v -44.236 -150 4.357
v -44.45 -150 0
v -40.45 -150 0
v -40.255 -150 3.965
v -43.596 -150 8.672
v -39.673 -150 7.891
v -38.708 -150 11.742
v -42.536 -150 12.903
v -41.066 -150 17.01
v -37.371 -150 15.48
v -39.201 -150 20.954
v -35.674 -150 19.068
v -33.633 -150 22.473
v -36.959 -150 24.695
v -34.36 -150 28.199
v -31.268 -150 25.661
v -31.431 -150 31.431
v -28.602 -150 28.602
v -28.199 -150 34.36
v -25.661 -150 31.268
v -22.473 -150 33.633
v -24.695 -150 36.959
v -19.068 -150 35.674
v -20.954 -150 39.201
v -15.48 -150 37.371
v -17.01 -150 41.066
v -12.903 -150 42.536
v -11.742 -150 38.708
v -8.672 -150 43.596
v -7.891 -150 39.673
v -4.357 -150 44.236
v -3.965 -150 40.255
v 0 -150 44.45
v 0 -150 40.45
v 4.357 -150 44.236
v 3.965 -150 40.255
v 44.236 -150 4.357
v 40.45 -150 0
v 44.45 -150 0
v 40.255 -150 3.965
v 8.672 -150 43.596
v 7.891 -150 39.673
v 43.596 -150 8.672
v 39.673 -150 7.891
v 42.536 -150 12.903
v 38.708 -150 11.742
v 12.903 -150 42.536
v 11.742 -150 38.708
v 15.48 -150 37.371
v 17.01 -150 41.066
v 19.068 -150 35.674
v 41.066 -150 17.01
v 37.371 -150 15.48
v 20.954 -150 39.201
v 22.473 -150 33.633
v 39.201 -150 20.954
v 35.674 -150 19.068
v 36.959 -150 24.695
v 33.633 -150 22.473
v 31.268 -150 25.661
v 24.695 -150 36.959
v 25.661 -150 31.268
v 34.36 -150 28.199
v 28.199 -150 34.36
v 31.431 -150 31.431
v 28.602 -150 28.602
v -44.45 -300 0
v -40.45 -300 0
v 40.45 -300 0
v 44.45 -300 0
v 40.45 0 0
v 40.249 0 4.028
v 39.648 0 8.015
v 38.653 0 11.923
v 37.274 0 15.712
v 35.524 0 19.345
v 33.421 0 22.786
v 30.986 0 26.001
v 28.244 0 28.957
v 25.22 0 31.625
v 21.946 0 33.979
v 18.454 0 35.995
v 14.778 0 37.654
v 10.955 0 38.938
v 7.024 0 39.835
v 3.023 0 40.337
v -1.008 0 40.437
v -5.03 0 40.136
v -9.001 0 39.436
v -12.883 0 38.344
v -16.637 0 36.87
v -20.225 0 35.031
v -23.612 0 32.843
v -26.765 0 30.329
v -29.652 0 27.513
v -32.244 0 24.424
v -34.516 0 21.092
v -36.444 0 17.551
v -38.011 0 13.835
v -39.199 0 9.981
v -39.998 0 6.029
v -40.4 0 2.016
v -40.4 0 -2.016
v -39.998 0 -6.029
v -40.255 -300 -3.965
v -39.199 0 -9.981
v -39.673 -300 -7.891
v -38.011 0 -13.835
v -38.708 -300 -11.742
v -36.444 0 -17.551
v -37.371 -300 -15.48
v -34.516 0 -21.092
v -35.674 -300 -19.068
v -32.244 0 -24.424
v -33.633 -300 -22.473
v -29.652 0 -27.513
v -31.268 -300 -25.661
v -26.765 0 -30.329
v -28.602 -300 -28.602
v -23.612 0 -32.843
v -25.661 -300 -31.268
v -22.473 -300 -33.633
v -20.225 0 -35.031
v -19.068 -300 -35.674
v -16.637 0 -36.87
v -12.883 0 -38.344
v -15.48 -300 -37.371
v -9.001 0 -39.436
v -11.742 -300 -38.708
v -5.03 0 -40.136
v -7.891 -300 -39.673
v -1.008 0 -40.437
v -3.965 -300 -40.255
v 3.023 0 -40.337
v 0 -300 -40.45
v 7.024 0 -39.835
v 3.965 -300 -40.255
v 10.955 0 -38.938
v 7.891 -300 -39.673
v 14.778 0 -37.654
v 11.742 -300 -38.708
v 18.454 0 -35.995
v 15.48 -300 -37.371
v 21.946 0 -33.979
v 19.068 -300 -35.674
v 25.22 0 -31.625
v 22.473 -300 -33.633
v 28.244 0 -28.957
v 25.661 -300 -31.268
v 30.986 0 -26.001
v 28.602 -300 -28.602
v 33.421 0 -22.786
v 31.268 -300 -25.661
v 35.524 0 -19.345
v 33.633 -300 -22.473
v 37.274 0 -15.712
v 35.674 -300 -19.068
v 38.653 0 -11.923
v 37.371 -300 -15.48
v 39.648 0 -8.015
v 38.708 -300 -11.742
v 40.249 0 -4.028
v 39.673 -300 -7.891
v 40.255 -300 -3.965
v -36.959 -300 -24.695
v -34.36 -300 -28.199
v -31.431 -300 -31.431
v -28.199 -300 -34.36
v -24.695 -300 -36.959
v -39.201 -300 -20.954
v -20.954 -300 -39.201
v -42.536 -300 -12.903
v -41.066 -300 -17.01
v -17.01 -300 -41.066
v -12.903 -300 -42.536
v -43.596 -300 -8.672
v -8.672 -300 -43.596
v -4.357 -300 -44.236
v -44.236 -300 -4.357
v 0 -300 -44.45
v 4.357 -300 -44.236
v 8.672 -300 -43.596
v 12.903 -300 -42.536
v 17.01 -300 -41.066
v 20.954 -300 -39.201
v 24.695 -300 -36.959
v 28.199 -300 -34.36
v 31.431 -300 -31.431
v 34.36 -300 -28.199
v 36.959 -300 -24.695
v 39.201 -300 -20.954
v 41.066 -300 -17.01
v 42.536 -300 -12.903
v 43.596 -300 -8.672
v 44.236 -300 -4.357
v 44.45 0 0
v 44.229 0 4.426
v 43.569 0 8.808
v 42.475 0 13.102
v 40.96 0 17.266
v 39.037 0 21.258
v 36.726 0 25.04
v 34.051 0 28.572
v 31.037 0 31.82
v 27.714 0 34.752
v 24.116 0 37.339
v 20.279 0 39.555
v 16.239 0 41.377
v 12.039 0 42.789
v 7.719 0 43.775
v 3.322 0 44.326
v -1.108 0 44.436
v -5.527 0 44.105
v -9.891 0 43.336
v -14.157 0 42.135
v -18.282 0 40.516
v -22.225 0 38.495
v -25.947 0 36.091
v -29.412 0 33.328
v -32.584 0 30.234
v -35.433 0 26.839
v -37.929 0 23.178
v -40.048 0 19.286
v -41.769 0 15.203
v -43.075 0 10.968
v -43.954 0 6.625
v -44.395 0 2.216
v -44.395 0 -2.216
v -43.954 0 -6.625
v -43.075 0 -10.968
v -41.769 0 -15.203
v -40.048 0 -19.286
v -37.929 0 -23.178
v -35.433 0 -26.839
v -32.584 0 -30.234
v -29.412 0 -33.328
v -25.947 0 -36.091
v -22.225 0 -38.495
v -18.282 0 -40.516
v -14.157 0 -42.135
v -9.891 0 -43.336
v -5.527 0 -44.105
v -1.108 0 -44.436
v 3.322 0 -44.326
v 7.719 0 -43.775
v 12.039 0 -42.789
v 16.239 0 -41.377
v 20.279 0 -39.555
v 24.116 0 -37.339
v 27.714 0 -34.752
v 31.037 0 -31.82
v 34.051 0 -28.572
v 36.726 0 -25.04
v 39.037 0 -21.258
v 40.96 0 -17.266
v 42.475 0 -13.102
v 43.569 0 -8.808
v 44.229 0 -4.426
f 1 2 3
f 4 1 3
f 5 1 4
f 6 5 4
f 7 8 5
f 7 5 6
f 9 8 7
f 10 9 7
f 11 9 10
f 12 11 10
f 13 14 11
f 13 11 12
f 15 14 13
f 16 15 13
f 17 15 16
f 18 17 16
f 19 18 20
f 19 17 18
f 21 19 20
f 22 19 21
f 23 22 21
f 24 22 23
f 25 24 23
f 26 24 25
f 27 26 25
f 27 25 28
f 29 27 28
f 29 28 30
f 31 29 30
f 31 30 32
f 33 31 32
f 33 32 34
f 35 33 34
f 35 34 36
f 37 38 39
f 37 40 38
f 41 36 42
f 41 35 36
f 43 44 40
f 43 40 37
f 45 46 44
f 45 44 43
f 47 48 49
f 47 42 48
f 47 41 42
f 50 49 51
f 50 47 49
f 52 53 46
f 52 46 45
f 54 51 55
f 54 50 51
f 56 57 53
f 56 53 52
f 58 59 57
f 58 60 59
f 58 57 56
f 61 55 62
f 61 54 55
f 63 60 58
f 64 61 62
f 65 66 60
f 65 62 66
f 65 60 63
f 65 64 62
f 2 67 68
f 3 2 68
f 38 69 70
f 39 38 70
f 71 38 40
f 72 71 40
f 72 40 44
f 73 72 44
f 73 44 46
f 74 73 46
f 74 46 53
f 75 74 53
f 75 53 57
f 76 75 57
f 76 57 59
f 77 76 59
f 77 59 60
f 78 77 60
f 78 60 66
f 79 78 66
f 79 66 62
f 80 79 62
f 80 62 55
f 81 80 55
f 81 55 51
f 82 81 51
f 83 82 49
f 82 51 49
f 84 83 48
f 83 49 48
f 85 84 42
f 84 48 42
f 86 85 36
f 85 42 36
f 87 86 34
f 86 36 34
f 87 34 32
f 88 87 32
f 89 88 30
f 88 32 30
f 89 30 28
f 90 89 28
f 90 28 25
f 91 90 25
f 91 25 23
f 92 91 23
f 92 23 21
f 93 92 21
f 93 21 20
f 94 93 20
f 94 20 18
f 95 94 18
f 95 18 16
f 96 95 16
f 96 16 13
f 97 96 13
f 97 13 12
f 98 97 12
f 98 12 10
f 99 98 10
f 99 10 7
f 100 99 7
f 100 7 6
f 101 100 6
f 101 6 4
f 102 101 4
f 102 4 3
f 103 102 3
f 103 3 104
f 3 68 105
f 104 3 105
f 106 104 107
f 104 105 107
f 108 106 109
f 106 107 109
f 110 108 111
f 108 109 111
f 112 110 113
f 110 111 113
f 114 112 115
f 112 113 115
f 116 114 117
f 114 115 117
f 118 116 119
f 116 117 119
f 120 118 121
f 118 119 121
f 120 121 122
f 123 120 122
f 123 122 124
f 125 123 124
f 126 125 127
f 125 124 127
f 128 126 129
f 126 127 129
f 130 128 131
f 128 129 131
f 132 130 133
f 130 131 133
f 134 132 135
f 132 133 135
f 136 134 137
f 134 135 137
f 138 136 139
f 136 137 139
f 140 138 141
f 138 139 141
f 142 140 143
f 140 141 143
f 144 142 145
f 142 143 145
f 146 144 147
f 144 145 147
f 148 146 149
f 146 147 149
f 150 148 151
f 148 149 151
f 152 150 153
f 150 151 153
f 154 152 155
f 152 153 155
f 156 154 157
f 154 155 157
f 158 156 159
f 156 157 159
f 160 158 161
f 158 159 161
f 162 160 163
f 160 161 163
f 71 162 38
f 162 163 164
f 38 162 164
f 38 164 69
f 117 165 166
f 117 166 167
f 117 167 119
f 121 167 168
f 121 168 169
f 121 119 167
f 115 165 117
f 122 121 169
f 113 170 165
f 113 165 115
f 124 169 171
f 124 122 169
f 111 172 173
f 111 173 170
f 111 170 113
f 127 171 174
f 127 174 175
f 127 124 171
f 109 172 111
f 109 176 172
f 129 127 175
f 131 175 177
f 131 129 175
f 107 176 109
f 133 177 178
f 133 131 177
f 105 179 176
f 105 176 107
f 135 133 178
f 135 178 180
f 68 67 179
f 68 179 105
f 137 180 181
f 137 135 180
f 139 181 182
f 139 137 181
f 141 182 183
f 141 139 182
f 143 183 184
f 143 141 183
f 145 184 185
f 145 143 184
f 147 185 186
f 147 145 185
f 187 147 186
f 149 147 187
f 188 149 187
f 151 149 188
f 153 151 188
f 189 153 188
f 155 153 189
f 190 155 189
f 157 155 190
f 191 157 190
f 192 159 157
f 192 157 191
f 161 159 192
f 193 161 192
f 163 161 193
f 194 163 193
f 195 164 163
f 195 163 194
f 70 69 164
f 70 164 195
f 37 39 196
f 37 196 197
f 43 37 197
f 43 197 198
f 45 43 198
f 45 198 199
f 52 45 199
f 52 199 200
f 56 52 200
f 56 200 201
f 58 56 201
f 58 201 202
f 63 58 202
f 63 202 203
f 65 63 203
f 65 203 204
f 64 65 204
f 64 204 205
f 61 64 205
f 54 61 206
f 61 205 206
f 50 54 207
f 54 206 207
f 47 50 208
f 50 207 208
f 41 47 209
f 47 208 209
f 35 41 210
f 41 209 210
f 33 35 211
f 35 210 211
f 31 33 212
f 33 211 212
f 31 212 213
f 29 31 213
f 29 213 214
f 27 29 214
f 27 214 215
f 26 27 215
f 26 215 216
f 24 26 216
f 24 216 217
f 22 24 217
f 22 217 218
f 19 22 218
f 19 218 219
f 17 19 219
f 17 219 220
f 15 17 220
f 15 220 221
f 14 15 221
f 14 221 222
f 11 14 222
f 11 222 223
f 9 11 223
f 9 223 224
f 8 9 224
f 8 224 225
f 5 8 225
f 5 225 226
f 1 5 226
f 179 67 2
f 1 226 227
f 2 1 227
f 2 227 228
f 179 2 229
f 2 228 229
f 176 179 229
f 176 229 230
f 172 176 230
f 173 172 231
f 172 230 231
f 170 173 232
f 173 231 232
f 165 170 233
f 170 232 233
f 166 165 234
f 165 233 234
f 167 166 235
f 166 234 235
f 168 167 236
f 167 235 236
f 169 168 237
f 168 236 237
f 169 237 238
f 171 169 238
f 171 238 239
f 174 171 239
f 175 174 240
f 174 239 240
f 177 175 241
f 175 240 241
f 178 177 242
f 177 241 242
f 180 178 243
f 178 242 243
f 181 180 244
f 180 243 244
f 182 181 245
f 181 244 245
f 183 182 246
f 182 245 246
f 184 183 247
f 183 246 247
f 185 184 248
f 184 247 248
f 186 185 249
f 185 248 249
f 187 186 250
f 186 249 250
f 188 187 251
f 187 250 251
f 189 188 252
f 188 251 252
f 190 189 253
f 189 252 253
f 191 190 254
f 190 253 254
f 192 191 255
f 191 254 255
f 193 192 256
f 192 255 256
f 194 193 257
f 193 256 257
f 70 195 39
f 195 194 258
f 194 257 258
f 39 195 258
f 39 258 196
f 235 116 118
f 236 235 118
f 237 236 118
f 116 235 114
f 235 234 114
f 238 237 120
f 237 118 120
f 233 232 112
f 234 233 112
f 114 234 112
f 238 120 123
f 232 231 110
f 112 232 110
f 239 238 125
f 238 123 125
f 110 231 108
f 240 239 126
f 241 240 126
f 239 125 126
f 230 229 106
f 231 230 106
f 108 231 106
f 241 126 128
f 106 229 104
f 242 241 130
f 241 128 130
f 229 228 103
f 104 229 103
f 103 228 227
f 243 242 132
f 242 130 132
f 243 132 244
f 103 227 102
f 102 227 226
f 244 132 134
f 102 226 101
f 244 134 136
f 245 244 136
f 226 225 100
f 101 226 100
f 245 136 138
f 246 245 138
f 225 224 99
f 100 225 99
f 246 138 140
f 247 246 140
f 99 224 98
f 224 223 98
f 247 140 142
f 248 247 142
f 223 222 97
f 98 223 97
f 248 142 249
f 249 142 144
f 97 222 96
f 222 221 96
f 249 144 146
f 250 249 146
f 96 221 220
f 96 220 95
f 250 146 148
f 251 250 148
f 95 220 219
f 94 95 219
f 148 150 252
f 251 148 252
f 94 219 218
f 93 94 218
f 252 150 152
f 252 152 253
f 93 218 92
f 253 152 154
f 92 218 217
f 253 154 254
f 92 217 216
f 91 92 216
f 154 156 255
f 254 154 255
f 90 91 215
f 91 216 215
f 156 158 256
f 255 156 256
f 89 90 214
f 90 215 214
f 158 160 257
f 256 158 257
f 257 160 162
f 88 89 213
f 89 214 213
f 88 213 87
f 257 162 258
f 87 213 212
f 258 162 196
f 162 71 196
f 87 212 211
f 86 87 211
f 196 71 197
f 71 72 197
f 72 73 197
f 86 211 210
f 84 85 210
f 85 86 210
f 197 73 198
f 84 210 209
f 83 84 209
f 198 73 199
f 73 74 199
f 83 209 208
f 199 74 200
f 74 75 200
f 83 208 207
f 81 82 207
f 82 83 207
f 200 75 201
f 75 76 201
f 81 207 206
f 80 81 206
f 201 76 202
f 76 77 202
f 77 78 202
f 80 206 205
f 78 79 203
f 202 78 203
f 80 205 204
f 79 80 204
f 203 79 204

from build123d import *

# Parameters (mm, degrees)
F0_R     = 44.45
F1_DEPTH = 300
F3_DEPTH = 150
F5_D     = 80.9
F5_DEPTH = 300


with BuildPart() as f1:
    # F0 (on Front) → F1 (new body)
    with BuildSketch(Plane.XZ):
        Circle(F0_R)
    extrude(amount=F1_DEPTH)

    # F2 (on face) → F3 (cut)
    with BuildSketch(Plane.XZ.offset(300)):
        with BuildLine():
            ThreePointArc((44.45, 0), (0, 44.45), (-44.45, 0))
            Line((-44.45, 0), (44.45, 0))
        make_face()
    extrude(amount=-F3_DEPTH, mode=Mode.SUBTRACT)

    # F5
    with Locations(Plane(origin=(0, 0, 0), x_dir=(-1, 0, 0), z_dir=(0, 1, 0))):
        with Locations((0, 0)):
            Hole(F5_D / 2, depth=F5_DEPTH)


solid = f1.part
